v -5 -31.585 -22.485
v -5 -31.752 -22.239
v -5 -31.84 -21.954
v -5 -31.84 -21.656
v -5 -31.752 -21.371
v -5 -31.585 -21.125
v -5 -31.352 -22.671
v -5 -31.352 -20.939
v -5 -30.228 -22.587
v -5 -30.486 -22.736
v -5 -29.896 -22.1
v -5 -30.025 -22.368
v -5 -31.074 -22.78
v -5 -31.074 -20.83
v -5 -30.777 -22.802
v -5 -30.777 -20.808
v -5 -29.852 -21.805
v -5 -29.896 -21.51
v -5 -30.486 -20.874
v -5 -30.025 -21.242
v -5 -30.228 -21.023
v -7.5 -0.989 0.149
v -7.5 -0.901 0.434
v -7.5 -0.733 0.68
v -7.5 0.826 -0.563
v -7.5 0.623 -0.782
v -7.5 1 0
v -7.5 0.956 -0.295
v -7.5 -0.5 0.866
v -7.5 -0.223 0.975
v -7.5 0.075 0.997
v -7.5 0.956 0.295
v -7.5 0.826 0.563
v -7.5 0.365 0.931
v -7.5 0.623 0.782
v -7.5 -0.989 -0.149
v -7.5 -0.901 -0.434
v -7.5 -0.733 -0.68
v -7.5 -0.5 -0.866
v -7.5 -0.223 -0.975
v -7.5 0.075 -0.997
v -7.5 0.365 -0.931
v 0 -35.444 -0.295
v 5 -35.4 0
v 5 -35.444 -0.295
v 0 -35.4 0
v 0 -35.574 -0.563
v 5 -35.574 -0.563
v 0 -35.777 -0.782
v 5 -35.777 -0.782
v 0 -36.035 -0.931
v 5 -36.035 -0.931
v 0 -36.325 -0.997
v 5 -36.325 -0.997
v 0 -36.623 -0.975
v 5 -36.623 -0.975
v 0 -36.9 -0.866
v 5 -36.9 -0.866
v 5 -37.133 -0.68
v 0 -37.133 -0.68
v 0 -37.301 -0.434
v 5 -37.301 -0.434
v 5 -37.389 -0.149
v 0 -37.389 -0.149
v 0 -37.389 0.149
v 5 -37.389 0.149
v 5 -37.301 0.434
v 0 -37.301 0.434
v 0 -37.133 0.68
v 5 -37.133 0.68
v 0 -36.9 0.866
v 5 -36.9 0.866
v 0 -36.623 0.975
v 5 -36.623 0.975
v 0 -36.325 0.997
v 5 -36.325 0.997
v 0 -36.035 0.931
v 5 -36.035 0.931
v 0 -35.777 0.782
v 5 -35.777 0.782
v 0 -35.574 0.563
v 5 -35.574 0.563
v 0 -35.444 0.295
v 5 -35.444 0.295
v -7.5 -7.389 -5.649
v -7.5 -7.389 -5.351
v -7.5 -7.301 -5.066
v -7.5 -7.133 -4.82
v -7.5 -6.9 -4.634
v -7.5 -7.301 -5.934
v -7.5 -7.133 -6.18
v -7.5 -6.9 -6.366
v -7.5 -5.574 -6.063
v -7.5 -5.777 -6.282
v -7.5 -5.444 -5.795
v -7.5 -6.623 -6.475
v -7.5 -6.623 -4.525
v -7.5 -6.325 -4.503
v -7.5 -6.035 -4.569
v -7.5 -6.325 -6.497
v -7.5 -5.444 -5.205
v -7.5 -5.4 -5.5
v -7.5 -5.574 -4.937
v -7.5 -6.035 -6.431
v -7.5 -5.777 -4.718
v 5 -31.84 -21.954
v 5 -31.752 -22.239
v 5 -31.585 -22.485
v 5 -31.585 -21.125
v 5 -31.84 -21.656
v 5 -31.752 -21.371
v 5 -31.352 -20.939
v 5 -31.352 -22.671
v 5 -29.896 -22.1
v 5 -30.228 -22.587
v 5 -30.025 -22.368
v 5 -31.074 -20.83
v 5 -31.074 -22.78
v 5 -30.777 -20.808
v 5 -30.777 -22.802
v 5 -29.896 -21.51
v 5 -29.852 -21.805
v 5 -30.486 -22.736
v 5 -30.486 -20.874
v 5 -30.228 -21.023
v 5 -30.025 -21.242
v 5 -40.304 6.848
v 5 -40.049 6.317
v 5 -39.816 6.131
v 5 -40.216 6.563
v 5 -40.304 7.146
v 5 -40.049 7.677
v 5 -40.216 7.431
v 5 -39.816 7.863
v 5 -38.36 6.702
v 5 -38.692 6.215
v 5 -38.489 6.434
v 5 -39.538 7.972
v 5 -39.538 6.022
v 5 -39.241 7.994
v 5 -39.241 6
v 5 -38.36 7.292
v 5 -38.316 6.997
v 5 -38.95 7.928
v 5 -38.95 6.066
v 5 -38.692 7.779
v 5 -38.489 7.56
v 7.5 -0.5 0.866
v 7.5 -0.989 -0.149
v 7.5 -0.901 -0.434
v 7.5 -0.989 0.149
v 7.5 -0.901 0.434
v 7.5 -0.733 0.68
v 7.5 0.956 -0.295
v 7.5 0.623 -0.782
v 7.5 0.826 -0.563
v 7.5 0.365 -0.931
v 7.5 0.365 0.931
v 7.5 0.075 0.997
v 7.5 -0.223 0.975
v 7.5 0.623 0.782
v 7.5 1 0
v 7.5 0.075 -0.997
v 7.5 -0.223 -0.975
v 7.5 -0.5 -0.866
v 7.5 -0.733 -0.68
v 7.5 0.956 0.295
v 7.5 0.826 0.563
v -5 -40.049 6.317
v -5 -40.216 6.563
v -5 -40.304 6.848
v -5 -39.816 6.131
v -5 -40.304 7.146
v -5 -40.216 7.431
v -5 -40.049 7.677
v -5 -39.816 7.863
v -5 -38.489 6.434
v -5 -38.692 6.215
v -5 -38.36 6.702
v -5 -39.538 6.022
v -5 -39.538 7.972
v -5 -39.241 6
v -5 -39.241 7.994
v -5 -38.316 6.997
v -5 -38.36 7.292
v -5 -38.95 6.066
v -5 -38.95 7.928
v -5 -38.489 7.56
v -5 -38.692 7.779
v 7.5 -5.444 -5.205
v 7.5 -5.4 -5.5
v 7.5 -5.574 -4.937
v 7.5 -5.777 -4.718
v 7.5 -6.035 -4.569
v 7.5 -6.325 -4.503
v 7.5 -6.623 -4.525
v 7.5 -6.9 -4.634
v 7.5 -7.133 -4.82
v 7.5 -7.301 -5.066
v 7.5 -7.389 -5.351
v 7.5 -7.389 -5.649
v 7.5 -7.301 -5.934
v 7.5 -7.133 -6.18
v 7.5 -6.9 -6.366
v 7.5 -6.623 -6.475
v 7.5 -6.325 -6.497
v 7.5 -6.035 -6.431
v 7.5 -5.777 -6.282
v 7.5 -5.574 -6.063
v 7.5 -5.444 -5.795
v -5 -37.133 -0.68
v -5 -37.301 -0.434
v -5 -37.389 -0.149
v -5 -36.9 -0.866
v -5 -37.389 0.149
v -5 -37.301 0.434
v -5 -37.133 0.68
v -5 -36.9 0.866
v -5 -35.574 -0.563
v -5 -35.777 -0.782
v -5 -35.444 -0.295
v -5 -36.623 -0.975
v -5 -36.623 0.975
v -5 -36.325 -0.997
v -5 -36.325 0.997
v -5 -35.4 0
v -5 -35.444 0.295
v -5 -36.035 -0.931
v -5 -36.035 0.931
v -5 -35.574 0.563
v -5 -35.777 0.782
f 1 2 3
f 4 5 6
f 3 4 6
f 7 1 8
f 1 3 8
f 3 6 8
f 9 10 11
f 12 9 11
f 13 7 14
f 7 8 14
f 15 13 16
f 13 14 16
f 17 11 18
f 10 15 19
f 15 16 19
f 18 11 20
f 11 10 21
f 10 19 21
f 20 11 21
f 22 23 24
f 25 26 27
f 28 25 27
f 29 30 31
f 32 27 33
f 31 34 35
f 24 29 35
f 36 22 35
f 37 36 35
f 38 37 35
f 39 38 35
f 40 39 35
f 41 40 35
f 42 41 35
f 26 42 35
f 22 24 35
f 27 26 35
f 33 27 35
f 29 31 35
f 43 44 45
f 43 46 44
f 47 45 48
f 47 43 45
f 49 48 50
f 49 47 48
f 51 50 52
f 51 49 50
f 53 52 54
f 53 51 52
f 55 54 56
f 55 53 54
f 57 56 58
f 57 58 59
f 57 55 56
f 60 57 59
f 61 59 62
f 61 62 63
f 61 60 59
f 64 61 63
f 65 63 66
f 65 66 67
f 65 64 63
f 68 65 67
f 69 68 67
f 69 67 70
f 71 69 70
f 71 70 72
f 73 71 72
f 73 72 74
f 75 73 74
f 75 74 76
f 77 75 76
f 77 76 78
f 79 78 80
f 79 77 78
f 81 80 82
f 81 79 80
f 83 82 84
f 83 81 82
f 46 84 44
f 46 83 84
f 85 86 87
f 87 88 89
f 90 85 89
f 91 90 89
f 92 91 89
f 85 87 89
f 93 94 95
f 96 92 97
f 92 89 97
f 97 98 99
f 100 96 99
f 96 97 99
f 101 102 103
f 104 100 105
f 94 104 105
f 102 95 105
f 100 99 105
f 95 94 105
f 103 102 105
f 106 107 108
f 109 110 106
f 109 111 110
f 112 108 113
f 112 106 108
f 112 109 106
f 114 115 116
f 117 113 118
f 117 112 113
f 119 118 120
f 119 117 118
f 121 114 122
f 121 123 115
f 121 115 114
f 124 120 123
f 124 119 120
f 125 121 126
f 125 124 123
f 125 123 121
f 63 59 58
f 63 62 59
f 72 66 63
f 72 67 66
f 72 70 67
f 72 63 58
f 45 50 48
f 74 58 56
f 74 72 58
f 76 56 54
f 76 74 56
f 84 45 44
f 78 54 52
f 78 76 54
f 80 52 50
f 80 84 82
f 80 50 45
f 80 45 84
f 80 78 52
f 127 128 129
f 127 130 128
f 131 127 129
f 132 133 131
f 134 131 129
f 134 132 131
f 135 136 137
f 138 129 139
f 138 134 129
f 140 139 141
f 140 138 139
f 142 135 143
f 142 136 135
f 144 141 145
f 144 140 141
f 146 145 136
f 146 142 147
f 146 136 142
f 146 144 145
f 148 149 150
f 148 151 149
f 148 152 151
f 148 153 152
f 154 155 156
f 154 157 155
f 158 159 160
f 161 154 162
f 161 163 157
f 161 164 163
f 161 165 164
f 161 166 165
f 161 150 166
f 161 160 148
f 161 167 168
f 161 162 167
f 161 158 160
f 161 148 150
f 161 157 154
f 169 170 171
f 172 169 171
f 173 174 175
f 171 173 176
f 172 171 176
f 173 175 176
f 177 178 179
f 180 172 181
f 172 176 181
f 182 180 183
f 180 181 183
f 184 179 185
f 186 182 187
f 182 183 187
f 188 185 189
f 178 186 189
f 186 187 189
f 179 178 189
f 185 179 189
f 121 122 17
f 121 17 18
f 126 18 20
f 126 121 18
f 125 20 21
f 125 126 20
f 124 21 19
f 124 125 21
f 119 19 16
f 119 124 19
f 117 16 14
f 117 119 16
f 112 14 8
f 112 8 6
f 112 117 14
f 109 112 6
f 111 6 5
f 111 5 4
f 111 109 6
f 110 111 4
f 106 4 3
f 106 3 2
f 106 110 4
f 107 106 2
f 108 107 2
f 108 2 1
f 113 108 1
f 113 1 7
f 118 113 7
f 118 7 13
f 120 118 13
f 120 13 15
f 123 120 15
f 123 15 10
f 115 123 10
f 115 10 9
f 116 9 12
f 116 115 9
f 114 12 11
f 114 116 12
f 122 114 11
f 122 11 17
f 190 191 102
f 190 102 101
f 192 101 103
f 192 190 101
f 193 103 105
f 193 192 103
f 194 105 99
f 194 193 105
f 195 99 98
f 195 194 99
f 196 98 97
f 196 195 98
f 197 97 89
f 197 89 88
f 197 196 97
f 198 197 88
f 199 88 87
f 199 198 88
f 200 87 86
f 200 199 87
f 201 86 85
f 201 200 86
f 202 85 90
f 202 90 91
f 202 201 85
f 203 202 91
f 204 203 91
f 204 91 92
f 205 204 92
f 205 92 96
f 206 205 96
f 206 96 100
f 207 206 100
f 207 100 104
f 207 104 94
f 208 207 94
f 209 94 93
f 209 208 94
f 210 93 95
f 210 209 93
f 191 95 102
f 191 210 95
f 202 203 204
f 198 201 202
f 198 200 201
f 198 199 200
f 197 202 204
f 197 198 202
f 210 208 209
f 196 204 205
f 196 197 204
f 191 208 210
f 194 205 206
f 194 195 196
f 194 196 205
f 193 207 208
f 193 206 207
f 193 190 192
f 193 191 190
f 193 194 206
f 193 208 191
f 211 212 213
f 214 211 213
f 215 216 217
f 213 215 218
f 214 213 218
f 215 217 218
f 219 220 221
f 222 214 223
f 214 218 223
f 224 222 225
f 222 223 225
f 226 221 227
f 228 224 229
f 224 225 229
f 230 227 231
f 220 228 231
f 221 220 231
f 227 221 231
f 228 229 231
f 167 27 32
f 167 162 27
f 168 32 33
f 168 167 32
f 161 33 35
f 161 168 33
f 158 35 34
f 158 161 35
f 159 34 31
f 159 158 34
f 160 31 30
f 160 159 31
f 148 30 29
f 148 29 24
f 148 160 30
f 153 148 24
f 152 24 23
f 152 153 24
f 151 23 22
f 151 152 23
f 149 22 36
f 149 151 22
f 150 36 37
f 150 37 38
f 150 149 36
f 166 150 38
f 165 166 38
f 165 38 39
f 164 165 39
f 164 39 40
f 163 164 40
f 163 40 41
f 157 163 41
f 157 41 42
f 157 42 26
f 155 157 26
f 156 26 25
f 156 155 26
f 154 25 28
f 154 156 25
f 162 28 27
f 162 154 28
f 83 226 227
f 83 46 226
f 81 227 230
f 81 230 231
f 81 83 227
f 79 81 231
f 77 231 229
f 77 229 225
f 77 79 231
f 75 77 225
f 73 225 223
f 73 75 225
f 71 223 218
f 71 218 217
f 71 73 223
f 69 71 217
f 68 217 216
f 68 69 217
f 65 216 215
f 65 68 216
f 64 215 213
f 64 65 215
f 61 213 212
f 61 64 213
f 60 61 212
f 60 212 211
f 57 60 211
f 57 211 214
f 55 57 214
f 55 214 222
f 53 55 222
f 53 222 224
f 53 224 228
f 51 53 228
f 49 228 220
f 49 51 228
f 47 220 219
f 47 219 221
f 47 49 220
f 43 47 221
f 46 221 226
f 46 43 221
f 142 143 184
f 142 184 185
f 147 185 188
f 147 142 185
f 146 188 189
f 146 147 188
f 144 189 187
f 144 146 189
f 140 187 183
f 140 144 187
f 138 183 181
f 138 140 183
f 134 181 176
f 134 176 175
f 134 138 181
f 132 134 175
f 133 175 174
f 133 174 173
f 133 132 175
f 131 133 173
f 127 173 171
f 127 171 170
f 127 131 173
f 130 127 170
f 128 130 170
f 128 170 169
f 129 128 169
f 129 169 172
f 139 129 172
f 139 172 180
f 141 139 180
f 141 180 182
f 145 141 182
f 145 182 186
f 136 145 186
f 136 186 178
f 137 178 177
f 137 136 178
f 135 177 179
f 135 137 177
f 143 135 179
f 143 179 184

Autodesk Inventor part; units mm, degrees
sketch "スケッチ1" plane through (0, 0, 0) normal (1, 0, 0) x (0, 1, 0)
  circle A0 centre (0, 0) radius 1
  circle A1 centre (-36.4, 0) radius 1
  circle A2 centre (-30.8515, -21.8051) radius 1
  line L0 (-36.4, 0) -> (0, 0)
  line L1 (-30.8515, -21.8051) -> (-36.4, 0)
  line L2 (0, 0) -> (0, 70.9009)
  circle A3 centre (-6.4, -5.5) radius 1
  circle A4 centre (-39.3155, 6.9971) radius 1
  line L3 (0, 0) -> (-6.4, -5.5)
  line L4 (-39.3155, 6.9971) -> (-36.4, 0)
  line L5 (-48.5786, 0) -> (9.2631, 0) projected
  line L6 (-39.3155, 6.9971) -> (-38.2495, 7.2684)
  line L7 (-36.4, 0) -> (-38.2495, 7.2684)
  line L8 (-6.4, -5.5) -> (-39.3155, 6.9971)
  line L9 (-6.4, -5.5) -> (-5.2926, 1.9178)
  line L10 (-5.2926, 1.9178) -> (-39.3155, 6.9971)
  dimension "d0" = 2
  dimension "d1" = 2
  dimension "d2" = 2
  dimension "d3" = 36.4
  dimension "d4" = 22.5
  dimension "d5" = 90
  dimension "d9" = 2
  dimension "d10" = 2
  dimension "d23" = 1.1
  dimension "d24" = 7.5
  dimension "d29" = 6.4
  dimension "d30" = 5.5
  dimension "d33" = 7.5
  dimension "d34" = 34.4
extrude "押し出し1" add sketch "スケッチ1" along normal mid plane 10 contours L5 L2 A0 | A0 L3 L5 | L2 L0 A0 | A0 L0 L3 | L3 L9 A3 | A3 L8 L3 | L9 L8 A3 | L0 L7 A1 | A1 L1 L0 | L7 L4 A1 | A1 L5 L1 | L5 A1 L4 | L8 L10 A4 | A4 L4 L8 | L10 L6 A4 | A4 L6 L4 | A2
offset faces "サイズ1" outward 2.5 faces at (5, 0.5848, -0.397) (-5, 0.5848, -0.397) (5, -6.7236, -5.5798) (-5, -6.0764, -5.4202)
properties part number "HbFingerPosture_flex02"
